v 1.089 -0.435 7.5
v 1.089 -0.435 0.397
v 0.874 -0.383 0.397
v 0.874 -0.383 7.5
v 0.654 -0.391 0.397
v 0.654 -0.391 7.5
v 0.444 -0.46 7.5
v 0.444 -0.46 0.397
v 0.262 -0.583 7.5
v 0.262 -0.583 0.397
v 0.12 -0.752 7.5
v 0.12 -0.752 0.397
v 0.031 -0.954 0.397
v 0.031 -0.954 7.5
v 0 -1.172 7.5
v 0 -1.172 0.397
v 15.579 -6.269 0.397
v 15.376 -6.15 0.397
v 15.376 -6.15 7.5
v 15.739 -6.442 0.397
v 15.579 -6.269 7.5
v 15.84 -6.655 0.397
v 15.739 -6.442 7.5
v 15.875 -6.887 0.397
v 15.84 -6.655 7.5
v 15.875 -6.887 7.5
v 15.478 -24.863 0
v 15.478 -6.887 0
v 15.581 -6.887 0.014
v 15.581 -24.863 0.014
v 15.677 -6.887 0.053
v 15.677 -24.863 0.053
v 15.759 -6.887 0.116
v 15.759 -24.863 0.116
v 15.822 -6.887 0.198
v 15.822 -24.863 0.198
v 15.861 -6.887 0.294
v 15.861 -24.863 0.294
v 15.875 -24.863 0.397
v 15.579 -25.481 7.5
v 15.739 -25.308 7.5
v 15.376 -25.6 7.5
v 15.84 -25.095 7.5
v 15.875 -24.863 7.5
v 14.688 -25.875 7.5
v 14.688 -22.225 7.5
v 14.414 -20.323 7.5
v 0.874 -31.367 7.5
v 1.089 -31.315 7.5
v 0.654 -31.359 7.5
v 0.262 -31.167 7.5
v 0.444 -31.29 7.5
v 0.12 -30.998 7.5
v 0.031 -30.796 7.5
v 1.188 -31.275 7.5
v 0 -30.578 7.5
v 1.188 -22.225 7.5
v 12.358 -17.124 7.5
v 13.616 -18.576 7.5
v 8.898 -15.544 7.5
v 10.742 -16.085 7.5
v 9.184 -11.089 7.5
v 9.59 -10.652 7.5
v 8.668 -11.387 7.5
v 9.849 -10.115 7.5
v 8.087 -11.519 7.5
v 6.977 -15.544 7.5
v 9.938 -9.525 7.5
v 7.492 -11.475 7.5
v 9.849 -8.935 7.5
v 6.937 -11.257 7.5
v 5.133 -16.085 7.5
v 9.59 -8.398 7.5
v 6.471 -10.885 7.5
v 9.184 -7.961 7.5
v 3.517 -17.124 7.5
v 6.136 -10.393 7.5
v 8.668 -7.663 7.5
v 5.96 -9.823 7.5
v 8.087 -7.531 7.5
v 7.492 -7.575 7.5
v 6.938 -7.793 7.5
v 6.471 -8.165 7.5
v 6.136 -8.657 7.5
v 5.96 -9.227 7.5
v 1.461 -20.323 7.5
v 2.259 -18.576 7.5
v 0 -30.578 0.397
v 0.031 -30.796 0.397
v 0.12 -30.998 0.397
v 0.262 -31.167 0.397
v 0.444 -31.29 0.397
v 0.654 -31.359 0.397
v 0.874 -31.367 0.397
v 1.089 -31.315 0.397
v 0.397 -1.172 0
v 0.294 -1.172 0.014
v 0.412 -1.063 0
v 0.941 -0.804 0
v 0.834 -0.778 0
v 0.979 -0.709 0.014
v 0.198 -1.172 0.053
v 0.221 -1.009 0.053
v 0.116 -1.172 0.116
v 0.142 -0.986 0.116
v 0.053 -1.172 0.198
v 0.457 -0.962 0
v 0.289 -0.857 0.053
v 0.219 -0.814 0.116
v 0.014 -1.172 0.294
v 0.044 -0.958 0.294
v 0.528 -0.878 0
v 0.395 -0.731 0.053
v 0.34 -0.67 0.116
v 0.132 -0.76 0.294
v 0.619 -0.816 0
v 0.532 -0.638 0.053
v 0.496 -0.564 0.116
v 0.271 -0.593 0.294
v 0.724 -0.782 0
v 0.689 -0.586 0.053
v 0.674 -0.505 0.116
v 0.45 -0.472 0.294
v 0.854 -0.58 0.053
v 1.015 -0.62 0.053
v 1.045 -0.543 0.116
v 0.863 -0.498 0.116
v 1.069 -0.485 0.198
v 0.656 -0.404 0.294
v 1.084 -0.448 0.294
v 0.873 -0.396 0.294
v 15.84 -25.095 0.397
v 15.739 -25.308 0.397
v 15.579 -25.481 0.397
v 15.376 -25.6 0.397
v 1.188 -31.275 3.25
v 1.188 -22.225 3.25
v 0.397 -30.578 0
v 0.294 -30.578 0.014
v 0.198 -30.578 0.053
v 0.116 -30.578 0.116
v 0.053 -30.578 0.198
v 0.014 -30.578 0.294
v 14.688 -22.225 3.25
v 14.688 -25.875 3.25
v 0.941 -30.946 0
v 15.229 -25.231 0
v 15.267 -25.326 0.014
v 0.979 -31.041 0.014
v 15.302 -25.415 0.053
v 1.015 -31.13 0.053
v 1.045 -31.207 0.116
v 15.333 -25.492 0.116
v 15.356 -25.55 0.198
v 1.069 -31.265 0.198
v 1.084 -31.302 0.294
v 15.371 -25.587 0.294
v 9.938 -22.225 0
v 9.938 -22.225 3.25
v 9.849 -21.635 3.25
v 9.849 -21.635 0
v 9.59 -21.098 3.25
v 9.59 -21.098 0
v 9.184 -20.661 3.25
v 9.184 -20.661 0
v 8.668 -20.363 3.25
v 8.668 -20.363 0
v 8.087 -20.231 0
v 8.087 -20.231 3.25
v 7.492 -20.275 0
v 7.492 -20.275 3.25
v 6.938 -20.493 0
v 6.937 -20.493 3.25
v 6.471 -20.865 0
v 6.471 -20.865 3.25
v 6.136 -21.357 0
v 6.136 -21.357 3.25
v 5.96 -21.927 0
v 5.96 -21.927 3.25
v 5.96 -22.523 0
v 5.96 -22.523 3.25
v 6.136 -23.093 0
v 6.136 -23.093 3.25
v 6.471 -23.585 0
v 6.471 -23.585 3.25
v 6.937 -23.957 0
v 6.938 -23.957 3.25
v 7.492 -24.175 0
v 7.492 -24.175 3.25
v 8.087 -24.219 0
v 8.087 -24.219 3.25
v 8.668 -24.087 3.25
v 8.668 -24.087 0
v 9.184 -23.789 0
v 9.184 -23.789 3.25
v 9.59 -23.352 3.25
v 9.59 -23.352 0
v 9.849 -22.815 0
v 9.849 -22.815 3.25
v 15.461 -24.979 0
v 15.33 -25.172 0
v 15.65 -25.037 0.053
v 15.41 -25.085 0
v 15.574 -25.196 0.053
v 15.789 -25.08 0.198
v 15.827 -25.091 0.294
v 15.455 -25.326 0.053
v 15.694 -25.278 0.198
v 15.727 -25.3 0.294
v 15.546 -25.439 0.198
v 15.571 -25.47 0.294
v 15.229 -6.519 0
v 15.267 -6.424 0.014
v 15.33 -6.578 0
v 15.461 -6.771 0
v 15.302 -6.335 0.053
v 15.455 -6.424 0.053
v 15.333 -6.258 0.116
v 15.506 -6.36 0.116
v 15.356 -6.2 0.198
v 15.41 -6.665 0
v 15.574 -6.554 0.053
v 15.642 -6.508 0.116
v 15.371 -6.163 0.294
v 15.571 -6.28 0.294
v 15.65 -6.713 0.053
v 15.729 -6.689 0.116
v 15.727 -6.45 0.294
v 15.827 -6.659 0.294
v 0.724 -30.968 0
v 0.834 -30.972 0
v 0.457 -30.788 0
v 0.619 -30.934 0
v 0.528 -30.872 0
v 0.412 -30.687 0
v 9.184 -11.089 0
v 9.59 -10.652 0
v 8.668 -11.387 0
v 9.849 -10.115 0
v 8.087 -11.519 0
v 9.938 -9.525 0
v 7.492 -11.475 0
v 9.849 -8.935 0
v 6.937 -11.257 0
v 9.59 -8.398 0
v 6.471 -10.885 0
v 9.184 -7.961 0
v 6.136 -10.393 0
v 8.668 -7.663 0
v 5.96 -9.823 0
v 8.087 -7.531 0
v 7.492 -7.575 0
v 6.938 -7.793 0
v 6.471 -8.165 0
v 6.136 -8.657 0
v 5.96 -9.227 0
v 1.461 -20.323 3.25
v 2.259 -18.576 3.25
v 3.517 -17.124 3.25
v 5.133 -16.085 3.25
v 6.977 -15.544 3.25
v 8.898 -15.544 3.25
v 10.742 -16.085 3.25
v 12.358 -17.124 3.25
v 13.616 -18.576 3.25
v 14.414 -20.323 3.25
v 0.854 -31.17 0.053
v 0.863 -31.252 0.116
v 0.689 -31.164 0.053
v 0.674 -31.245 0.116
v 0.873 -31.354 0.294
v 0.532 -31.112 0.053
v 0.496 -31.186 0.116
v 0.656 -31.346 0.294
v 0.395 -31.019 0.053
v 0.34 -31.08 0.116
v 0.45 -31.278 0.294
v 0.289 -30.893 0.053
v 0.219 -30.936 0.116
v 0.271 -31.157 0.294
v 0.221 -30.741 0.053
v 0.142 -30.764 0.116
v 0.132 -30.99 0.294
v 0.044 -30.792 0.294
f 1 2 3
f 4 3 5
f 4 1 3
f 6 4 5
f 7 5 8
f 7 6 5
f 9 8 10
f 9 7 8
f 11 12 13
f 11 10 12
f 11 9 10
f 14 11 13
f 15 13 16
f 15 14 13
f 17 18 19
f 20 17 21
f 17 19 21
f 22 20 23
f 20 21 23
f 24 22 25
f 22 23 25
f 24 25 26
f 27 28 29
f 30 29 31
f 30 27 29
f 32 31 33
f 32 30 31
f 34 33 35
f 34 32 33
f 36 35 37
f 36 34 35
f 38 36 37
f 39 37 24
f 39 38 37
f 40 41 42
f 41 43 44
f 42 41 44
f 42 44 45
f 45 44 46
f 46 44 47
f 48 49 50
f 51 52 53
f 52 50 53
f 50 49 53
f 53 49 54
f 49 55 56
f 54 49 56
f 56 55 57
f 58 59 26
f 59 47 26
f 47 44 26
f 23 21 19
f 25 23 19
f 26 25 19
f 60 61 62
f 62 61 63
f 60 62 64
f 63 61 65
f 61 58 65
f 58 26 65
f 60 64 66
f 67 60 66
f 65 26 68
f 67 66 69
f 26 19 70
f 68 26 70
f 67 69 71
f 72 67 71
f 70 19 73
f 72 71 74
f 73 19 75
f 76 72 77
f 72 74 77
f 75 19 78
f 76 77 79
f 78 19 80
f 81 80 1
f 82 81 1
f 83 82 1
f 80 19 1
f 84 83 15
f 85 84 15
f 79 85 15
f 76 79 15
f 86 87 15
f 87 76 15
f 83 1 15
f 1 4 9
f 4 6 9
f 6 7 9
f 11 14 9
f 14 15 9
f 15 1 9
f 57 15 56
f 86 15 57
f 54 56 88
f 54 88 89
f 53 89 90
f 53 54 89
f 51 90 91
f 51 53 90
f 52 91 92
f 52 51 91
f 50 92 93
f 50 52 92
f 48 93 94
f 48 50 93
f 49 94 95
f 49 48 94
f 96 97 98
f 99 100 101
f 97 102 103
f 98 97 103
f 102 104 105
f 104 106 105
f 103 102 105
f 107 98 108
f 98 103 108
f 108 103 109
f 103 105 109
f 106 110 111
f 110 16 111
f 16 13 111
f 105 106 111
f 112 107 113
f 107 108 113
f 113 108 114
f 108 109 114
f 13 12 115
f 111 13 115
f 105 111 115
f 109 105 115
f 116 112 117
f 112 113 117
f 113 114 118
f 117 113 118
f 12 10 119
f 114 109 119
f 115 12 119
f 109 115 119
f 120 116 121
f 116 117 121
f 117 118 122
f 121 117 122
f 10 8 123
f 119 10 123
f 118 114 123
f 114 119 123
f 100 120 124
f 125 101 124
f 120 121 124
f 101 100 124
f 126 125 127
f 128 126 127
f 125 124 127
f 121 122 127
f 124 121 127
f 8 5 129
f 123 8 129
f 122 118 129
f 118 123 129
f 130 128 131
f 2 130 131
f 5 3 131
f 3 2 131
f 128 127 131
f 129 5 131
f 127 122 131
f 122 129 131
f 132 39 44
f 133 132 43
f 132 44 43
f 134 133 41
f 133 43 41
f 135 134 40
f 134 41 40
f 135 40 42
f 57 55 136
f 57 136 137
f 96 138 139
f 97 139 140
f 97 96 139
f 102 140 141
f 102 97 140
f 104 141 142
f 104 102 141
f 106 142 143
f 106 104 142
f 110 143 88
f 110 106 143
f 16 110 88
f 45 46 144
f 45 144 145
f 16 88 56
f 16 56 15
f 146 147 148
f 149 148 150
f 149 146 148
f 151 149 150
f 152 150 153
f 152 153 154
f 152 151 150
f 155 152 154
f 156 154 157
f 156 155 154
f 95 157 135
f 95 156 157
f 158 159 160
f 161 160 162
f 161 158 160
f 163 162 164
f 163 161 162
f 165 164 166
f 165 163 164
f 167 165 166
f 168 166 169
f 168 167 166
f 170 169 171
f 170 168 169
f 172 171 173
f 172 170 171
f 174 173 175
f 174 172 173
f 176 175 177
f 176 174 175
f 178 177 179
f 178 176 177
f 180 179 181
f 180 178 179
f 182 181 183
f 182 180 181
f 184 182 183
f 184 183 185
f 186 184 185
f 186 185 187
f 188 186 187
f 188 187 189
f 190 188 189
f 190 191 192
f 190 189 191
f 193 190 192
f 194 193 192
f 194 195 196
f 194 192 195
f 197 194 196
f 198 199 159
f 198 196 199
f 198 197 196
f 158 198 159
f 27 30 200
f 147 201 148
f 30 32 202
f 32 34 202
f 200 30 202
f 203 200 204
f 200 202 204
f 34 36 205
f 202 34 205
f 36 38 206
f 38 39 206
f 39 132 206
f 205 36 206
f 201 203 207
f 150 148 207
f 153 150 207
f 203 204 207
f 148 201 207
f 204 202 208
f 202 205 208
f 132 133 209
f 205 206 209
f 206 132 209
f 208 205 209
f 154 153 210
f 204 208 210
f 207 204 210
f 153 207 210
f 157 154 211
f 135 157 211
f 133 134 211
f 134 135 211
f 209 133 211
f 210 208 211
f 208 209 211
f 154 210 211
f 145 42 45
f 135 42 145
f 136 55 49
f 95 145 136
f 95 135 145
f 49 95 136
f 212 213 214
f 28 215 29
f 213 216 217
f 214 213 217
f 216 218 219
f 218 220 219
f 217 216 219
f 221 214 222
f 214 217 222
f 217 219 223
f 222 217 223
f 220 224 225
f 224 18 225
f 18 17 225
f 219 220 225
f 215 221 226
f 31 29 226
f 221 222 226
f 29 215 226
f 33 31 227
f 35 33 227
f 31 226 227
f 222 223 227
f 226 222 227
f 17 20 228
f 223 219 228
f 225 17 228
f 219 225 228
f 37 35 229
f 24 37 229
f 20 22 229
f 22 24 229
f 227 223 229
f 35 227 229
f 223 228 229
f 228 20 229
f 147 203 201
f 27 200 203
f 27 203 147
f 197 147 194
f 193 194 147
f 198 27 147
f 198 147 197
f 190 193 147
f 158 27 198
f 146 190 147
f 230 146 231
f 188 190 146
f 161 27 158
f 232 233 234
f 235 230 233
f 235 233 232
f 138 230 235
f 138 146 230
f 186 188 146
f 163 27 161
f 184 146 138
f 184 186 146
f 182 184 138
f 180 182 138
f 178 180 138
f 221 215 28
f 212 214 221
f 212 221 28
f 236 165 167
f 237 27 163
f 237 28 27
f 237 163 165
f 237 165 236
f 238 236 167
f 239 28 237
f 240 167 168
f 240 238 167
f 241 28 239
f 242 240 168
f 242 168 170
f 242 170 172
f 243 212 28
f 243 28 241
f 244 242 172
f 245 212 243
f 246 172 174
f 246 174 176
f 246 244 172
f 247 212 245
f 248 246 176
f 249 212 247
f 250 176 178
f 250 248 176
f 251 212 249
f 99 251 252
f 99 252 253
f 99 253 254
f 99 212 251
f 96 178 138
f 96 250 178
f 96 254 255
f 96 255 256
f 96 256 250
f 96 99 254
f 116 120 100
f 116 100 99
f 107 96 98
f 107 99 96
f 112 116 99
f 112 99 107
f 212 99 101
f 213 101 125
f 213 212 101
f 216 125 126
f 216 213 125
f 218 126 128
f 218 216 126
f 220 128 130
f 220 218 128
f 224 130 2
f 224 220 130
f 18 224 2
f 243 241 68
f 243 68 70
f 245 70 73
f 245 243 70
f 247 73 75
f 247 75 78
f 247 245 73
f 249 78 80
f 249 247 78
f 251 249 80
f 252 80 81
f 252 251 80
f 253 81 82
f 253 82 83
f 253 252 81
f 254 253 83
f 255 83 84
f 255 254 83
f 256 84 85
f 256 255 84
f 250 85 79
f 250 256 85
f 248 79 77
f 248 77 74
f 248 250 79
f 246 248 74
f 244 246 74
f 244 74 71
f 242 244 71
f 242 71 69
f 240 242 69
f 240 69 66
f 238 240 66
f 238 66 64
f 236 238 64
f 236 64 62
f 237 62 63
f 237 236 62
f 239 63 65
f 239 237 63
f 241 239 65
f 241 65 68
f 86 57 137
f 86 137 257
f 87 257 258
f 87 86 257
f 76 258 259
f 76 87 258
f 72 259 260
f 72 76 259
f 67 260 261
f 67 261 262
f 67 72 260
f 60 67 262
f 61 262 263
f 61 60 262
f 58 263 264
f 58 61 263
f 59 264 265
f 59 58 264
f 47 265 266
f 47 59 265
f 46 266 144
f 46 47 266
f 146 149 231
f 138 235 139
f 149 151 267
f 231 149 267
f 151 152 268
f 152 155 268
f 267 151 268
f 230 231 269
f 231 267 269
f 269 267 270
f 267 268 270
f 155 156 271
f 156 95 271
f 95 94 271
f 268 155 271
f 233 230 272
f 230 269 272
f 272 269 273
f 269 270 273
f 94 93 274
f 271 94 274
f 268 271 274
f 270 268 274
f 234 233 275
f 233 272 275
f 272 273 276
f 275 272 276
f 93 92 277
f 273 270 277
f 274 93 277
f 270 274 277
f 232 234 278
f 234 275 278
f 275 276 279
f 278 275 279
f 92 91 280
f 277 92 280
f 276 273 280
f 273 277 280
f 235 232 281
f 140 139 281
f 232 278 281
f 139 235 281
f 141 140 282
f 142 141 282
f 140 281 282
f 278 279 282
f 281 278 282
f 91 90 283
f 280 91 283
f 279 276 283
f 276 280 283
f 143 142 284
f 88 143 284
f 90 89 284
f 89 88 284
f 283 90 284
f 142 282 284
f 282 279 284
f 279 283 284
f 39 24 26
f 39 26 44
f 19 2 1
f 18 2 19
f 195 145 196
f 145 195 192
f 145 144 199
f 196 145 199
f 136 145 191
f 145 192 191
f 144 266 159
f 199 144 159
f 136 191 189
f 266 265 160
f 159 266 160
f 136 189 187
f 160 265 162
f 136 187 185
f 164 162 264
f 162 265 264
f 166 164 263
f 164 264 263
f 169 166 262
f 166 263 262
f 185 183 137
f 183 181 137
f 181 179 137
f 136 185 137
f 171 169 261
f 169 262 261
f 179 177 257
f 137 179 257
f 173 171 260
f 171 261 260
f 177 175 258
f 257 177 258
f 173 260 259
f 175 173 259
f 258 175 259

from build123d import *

# Parameters (mm, degrees)
SKETCH1_R           = 2
BOSS_EXTRUDE1_DEPTH = 7.5
FILLET1_R           = 0.79375
CUT_EXTRUDE1_DEPTH  = 4.25
FILLET2_R           = 0.396875


with BuildPart() as part:
    # Sketch1 → Boss-Extrude1 (new body)
    with BuildSketch(Plane.XY):
        Polygon((0, 0), (15.875, -6.35), (15.875, -25.4), (0, -31.75), align=None)
        with Locations((7.9375, -22.225)):
            Circle(SKETCH1_R, mode=Mode.SUBTRACT)
        with Locations((7.9375, -9.525)):
            Circle(SKETCH1_R, mode=Mode.SUBTRACT)
    extrude(amount=BOSS_EXTRUDE1_DEPTH)

    # Fillet1
    fillet1_edges = [part.edges().sort_by_distance(p)[0] for p in [
        (0, 0, 3.75),
        (15.875, -6.35, 3.75),
        (15.875, -25.4, 3.75),
        (0, -31.75, 3.75),
    ]]
    fillet(fillet1_edges, radius=FILLET1_R)

    # Sketch2 → Cut-Extrude1 (cut)
    with BuildSketch(Plane.XY.offset(7.5)):
        with BuildLine():
            Line((14.6875, -22.225), (14.6875, -25.875))
            Line((14.6875, -25.875), (1.1875, -31.275))
            Line((1.1875, -31.275), (1.1875, -22.225))
            ThreePointArc((1.1875, -22.225), (7.9375, -15.475), (14.6875, -22.225))
        make_face()
    extrude(amount=-CUT_EXTRUDE1_DEPTH, mode=Mode.SUBTRACT)

    # Fillet2
    fillet2_edges = [part.edges().sort_by_distance(p)[0] for p in [
        (8.232291349, -28.45708346, 0),
        (0, -15.875, 0),
        (8.232291349, -3.29291654, 0),
        (15.875, -15.875, 0),
        (0.348750883, -0.515116549, 0),
        (15.738528364, -6.442395796, 0),
        (15.738528364, -25.307604204, 0),
        (0.348750883, -31.234883451, 0),
    ]]
    fillet(fillet2_edges, radius=FILLET2_R)


solid = part.part
